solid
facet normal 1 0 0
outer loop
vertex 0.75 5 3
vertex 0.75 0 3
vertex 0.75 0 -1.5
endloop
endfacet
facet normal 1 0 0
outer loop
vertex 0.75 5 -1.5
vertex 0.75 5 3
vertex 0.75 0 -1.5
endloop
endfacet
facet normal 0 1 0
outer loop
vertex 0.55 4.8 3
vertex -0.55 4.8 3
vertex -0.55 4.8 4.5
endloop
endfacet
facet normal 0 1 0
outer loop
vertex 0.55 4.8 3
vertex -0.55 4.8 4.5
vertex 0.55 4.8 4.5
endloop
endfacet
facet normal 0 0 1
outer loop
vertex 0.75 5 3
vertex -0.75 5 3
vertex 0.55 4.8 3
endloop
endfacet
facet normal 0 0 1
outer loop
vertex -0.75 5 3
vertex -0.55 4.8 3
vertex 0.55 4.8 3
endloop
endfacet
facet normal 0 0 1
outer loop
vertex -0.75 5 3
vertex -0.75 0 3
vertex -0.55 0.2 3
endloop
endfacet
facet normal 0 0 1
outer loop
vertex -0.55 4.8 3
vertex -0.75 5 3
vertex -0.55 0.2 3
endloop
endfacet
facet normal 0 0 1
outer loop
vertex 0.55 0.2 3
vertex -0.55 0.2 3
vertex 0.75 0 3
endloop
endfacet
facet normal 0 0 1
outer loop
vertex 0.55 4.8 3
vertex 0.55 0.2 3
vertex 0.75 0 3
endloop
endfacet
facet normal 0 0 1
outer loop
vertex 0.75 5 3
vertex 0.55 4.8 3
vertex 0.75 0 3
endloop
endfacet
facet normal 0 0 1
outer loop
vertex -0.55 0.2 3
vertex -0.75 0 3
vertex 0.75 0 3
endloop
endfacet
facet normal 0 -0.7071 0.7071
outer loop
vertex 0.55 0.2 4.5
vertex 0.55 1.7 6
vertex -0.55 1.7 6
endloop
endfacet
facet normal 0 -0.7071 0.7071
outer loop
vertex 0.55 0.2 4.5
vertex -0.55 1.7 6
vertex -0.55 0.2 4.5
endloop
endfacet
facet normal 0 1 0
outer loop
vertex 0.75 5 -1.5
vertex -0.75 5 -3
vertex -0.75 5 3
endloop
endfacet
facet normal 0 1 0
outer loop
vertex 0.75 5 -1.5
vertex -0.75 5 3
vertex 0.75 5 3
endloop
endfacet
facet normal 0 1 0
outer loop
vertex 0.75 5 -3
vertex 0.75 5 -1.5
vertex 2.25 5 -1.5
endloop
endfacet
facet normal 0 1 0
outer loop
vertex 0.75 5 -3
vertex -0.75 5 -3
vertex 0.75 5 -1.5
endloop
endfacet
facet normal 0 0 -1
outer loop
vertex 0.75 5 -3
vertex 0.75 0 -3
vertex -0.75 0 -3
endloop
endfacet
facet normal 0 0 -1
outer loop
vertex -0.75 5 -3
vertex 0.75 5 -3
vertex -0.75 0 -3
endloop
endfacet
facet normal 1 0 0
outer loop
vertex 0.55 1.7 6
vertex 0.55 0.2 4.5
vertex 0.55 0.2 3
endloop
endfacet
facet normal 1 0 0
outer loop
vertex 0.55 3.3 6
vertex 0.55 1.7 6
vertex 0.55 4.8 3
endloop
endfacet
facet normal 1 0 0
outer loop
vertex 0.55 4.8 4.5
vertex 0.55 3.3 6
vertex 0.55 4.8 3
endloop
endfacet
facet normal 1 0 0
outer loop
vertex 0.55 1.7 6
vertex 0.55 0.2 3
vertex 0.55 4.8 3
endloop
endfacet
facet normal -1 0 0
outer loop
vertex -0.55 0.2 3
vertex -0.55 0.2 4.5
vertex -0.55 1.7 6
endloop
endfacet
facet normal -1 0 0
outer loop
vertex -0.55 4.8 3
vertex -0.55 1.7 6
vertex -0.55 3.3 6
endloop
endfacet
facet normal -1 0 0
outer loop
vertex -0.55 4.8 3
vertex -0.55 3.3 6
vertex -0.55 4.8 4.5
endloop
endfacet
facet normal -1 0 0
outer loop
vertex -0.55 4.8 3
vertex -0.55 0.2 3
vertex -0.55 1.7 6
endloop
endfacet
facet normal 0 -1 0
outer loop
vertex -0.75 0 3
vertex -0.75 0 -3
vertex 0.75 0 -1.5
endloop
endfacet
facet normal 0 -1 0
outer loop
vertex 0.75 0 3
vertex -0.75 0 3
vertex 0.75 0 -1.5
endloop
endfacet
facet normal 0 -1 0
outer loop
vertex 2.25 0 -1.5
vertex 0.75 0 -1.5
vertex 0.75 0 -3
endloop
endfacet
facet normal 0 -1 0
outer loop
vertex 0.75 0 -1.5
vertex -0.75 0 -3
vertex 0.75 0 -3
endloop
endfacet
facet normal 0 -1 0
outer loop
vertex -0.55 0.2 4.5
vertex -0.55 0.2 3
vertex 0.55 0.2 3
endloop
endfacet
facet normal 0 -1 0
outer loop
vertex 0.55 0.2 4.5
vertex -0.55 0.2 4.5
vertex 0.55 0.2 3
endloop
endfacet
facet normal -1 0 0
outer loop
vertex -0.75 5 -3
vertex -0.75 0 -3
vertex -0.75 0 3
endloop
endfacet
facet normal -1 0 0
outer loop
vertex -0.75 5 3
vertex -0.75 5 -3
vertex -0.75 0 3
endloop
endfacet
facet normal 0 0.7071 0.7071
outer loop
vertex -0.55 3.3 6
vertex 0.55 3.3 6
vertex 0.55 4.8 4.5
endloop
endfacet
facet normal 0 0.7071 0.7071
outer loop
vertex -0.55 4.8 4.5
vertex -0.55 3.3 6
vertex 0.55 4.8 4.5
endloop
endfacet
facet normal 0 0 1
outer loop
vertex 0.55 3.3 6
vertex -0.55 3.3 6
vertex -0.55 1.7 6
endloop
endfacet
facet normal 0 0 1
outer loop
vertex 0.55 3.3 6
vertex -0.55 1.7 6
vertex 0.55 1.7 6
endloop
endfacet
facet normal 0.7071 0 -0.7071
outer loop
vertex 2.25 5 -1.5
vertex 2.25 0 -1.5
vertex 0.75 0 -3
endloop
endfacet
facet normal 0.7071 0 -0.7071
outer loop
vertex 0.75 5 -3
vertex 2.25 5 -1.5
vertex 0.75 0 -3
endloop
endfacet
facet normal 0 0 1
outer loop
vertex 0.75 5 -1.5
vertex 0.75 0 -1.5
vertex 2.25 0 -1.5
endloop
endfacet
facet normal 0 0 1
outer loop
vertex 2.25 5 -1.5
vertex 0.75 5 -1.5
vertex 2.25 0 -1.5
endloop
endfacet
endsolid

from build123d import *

# Parameters (mm, degrees)
BOSS_EXTRUDE1_DEPTH = 5
SKETCH2_W           = 1.1
SKETCH2_H           = 4.6
BOSS_EXTRUDE2_DEPTH = 3
CUT_EXTRUDE1_REACH  = 9.993


with BuildPart() as part:
    # Sketch1 → Boss-Extrude1 (new body)
    with BuildSketch(Plane(origin=(0, 0, 0), x_dir=(1, 0, 0), z_dir=(0, 1, 0))):
        Polygon((0.75, 1.5), (2.25, 1.5), (0.75, 3), (-0.75, 3), (-0.75, -3), (-0.7, -3), (0.7, -3), (0.75, -3), align=None)
    extrude(amount=BOSS_EXTRUDE1_DEPTH)

    # Sketch2 → Boss-Extrude2 (add)
    with BuildSketch(Plane.XY.offset(3)):
        with Locations((0, 2.5)):
            Rectangle(SKETCH2_W, SKETCH2_H)
    extrude(amount=BOSS_EXTRUDE2_DEPTH)

    # Sketch3 → Cut-Extrude1 (cut, up to next)
    with BuildSketch(Plane(origin=(0.55, 0, 0), x_dir=(0, 0, -1), z_dir=(1, 0, 0)), mode=Mode.PRIVATE) as cut_extrude1_sk1:
        Polygon((-6, 3.3), (-4.5, 4.8), (-6, 4.8), align=None)
    cut_extrude1_tool1 = extrude(cut_extrude1_sk1.sketch, amount=-CUT_EXTRUDE1_REACH, mode=Mode.PRIVATE) & part.part
    cut_extrude1 = cut_extrude1_tool1.solids().sort_by_distance((0.55, 4.3, 5.5))[0]
    add(cut_extrude1, mode=Mode.SUBTRACT)

    # Mirror1: Cut-Extrude1 across plane
    add(cut_extrude1.mirror(Plane.ZX.offset(2.5)), mode=Mode.SUBTRACT)


solid = part.part
